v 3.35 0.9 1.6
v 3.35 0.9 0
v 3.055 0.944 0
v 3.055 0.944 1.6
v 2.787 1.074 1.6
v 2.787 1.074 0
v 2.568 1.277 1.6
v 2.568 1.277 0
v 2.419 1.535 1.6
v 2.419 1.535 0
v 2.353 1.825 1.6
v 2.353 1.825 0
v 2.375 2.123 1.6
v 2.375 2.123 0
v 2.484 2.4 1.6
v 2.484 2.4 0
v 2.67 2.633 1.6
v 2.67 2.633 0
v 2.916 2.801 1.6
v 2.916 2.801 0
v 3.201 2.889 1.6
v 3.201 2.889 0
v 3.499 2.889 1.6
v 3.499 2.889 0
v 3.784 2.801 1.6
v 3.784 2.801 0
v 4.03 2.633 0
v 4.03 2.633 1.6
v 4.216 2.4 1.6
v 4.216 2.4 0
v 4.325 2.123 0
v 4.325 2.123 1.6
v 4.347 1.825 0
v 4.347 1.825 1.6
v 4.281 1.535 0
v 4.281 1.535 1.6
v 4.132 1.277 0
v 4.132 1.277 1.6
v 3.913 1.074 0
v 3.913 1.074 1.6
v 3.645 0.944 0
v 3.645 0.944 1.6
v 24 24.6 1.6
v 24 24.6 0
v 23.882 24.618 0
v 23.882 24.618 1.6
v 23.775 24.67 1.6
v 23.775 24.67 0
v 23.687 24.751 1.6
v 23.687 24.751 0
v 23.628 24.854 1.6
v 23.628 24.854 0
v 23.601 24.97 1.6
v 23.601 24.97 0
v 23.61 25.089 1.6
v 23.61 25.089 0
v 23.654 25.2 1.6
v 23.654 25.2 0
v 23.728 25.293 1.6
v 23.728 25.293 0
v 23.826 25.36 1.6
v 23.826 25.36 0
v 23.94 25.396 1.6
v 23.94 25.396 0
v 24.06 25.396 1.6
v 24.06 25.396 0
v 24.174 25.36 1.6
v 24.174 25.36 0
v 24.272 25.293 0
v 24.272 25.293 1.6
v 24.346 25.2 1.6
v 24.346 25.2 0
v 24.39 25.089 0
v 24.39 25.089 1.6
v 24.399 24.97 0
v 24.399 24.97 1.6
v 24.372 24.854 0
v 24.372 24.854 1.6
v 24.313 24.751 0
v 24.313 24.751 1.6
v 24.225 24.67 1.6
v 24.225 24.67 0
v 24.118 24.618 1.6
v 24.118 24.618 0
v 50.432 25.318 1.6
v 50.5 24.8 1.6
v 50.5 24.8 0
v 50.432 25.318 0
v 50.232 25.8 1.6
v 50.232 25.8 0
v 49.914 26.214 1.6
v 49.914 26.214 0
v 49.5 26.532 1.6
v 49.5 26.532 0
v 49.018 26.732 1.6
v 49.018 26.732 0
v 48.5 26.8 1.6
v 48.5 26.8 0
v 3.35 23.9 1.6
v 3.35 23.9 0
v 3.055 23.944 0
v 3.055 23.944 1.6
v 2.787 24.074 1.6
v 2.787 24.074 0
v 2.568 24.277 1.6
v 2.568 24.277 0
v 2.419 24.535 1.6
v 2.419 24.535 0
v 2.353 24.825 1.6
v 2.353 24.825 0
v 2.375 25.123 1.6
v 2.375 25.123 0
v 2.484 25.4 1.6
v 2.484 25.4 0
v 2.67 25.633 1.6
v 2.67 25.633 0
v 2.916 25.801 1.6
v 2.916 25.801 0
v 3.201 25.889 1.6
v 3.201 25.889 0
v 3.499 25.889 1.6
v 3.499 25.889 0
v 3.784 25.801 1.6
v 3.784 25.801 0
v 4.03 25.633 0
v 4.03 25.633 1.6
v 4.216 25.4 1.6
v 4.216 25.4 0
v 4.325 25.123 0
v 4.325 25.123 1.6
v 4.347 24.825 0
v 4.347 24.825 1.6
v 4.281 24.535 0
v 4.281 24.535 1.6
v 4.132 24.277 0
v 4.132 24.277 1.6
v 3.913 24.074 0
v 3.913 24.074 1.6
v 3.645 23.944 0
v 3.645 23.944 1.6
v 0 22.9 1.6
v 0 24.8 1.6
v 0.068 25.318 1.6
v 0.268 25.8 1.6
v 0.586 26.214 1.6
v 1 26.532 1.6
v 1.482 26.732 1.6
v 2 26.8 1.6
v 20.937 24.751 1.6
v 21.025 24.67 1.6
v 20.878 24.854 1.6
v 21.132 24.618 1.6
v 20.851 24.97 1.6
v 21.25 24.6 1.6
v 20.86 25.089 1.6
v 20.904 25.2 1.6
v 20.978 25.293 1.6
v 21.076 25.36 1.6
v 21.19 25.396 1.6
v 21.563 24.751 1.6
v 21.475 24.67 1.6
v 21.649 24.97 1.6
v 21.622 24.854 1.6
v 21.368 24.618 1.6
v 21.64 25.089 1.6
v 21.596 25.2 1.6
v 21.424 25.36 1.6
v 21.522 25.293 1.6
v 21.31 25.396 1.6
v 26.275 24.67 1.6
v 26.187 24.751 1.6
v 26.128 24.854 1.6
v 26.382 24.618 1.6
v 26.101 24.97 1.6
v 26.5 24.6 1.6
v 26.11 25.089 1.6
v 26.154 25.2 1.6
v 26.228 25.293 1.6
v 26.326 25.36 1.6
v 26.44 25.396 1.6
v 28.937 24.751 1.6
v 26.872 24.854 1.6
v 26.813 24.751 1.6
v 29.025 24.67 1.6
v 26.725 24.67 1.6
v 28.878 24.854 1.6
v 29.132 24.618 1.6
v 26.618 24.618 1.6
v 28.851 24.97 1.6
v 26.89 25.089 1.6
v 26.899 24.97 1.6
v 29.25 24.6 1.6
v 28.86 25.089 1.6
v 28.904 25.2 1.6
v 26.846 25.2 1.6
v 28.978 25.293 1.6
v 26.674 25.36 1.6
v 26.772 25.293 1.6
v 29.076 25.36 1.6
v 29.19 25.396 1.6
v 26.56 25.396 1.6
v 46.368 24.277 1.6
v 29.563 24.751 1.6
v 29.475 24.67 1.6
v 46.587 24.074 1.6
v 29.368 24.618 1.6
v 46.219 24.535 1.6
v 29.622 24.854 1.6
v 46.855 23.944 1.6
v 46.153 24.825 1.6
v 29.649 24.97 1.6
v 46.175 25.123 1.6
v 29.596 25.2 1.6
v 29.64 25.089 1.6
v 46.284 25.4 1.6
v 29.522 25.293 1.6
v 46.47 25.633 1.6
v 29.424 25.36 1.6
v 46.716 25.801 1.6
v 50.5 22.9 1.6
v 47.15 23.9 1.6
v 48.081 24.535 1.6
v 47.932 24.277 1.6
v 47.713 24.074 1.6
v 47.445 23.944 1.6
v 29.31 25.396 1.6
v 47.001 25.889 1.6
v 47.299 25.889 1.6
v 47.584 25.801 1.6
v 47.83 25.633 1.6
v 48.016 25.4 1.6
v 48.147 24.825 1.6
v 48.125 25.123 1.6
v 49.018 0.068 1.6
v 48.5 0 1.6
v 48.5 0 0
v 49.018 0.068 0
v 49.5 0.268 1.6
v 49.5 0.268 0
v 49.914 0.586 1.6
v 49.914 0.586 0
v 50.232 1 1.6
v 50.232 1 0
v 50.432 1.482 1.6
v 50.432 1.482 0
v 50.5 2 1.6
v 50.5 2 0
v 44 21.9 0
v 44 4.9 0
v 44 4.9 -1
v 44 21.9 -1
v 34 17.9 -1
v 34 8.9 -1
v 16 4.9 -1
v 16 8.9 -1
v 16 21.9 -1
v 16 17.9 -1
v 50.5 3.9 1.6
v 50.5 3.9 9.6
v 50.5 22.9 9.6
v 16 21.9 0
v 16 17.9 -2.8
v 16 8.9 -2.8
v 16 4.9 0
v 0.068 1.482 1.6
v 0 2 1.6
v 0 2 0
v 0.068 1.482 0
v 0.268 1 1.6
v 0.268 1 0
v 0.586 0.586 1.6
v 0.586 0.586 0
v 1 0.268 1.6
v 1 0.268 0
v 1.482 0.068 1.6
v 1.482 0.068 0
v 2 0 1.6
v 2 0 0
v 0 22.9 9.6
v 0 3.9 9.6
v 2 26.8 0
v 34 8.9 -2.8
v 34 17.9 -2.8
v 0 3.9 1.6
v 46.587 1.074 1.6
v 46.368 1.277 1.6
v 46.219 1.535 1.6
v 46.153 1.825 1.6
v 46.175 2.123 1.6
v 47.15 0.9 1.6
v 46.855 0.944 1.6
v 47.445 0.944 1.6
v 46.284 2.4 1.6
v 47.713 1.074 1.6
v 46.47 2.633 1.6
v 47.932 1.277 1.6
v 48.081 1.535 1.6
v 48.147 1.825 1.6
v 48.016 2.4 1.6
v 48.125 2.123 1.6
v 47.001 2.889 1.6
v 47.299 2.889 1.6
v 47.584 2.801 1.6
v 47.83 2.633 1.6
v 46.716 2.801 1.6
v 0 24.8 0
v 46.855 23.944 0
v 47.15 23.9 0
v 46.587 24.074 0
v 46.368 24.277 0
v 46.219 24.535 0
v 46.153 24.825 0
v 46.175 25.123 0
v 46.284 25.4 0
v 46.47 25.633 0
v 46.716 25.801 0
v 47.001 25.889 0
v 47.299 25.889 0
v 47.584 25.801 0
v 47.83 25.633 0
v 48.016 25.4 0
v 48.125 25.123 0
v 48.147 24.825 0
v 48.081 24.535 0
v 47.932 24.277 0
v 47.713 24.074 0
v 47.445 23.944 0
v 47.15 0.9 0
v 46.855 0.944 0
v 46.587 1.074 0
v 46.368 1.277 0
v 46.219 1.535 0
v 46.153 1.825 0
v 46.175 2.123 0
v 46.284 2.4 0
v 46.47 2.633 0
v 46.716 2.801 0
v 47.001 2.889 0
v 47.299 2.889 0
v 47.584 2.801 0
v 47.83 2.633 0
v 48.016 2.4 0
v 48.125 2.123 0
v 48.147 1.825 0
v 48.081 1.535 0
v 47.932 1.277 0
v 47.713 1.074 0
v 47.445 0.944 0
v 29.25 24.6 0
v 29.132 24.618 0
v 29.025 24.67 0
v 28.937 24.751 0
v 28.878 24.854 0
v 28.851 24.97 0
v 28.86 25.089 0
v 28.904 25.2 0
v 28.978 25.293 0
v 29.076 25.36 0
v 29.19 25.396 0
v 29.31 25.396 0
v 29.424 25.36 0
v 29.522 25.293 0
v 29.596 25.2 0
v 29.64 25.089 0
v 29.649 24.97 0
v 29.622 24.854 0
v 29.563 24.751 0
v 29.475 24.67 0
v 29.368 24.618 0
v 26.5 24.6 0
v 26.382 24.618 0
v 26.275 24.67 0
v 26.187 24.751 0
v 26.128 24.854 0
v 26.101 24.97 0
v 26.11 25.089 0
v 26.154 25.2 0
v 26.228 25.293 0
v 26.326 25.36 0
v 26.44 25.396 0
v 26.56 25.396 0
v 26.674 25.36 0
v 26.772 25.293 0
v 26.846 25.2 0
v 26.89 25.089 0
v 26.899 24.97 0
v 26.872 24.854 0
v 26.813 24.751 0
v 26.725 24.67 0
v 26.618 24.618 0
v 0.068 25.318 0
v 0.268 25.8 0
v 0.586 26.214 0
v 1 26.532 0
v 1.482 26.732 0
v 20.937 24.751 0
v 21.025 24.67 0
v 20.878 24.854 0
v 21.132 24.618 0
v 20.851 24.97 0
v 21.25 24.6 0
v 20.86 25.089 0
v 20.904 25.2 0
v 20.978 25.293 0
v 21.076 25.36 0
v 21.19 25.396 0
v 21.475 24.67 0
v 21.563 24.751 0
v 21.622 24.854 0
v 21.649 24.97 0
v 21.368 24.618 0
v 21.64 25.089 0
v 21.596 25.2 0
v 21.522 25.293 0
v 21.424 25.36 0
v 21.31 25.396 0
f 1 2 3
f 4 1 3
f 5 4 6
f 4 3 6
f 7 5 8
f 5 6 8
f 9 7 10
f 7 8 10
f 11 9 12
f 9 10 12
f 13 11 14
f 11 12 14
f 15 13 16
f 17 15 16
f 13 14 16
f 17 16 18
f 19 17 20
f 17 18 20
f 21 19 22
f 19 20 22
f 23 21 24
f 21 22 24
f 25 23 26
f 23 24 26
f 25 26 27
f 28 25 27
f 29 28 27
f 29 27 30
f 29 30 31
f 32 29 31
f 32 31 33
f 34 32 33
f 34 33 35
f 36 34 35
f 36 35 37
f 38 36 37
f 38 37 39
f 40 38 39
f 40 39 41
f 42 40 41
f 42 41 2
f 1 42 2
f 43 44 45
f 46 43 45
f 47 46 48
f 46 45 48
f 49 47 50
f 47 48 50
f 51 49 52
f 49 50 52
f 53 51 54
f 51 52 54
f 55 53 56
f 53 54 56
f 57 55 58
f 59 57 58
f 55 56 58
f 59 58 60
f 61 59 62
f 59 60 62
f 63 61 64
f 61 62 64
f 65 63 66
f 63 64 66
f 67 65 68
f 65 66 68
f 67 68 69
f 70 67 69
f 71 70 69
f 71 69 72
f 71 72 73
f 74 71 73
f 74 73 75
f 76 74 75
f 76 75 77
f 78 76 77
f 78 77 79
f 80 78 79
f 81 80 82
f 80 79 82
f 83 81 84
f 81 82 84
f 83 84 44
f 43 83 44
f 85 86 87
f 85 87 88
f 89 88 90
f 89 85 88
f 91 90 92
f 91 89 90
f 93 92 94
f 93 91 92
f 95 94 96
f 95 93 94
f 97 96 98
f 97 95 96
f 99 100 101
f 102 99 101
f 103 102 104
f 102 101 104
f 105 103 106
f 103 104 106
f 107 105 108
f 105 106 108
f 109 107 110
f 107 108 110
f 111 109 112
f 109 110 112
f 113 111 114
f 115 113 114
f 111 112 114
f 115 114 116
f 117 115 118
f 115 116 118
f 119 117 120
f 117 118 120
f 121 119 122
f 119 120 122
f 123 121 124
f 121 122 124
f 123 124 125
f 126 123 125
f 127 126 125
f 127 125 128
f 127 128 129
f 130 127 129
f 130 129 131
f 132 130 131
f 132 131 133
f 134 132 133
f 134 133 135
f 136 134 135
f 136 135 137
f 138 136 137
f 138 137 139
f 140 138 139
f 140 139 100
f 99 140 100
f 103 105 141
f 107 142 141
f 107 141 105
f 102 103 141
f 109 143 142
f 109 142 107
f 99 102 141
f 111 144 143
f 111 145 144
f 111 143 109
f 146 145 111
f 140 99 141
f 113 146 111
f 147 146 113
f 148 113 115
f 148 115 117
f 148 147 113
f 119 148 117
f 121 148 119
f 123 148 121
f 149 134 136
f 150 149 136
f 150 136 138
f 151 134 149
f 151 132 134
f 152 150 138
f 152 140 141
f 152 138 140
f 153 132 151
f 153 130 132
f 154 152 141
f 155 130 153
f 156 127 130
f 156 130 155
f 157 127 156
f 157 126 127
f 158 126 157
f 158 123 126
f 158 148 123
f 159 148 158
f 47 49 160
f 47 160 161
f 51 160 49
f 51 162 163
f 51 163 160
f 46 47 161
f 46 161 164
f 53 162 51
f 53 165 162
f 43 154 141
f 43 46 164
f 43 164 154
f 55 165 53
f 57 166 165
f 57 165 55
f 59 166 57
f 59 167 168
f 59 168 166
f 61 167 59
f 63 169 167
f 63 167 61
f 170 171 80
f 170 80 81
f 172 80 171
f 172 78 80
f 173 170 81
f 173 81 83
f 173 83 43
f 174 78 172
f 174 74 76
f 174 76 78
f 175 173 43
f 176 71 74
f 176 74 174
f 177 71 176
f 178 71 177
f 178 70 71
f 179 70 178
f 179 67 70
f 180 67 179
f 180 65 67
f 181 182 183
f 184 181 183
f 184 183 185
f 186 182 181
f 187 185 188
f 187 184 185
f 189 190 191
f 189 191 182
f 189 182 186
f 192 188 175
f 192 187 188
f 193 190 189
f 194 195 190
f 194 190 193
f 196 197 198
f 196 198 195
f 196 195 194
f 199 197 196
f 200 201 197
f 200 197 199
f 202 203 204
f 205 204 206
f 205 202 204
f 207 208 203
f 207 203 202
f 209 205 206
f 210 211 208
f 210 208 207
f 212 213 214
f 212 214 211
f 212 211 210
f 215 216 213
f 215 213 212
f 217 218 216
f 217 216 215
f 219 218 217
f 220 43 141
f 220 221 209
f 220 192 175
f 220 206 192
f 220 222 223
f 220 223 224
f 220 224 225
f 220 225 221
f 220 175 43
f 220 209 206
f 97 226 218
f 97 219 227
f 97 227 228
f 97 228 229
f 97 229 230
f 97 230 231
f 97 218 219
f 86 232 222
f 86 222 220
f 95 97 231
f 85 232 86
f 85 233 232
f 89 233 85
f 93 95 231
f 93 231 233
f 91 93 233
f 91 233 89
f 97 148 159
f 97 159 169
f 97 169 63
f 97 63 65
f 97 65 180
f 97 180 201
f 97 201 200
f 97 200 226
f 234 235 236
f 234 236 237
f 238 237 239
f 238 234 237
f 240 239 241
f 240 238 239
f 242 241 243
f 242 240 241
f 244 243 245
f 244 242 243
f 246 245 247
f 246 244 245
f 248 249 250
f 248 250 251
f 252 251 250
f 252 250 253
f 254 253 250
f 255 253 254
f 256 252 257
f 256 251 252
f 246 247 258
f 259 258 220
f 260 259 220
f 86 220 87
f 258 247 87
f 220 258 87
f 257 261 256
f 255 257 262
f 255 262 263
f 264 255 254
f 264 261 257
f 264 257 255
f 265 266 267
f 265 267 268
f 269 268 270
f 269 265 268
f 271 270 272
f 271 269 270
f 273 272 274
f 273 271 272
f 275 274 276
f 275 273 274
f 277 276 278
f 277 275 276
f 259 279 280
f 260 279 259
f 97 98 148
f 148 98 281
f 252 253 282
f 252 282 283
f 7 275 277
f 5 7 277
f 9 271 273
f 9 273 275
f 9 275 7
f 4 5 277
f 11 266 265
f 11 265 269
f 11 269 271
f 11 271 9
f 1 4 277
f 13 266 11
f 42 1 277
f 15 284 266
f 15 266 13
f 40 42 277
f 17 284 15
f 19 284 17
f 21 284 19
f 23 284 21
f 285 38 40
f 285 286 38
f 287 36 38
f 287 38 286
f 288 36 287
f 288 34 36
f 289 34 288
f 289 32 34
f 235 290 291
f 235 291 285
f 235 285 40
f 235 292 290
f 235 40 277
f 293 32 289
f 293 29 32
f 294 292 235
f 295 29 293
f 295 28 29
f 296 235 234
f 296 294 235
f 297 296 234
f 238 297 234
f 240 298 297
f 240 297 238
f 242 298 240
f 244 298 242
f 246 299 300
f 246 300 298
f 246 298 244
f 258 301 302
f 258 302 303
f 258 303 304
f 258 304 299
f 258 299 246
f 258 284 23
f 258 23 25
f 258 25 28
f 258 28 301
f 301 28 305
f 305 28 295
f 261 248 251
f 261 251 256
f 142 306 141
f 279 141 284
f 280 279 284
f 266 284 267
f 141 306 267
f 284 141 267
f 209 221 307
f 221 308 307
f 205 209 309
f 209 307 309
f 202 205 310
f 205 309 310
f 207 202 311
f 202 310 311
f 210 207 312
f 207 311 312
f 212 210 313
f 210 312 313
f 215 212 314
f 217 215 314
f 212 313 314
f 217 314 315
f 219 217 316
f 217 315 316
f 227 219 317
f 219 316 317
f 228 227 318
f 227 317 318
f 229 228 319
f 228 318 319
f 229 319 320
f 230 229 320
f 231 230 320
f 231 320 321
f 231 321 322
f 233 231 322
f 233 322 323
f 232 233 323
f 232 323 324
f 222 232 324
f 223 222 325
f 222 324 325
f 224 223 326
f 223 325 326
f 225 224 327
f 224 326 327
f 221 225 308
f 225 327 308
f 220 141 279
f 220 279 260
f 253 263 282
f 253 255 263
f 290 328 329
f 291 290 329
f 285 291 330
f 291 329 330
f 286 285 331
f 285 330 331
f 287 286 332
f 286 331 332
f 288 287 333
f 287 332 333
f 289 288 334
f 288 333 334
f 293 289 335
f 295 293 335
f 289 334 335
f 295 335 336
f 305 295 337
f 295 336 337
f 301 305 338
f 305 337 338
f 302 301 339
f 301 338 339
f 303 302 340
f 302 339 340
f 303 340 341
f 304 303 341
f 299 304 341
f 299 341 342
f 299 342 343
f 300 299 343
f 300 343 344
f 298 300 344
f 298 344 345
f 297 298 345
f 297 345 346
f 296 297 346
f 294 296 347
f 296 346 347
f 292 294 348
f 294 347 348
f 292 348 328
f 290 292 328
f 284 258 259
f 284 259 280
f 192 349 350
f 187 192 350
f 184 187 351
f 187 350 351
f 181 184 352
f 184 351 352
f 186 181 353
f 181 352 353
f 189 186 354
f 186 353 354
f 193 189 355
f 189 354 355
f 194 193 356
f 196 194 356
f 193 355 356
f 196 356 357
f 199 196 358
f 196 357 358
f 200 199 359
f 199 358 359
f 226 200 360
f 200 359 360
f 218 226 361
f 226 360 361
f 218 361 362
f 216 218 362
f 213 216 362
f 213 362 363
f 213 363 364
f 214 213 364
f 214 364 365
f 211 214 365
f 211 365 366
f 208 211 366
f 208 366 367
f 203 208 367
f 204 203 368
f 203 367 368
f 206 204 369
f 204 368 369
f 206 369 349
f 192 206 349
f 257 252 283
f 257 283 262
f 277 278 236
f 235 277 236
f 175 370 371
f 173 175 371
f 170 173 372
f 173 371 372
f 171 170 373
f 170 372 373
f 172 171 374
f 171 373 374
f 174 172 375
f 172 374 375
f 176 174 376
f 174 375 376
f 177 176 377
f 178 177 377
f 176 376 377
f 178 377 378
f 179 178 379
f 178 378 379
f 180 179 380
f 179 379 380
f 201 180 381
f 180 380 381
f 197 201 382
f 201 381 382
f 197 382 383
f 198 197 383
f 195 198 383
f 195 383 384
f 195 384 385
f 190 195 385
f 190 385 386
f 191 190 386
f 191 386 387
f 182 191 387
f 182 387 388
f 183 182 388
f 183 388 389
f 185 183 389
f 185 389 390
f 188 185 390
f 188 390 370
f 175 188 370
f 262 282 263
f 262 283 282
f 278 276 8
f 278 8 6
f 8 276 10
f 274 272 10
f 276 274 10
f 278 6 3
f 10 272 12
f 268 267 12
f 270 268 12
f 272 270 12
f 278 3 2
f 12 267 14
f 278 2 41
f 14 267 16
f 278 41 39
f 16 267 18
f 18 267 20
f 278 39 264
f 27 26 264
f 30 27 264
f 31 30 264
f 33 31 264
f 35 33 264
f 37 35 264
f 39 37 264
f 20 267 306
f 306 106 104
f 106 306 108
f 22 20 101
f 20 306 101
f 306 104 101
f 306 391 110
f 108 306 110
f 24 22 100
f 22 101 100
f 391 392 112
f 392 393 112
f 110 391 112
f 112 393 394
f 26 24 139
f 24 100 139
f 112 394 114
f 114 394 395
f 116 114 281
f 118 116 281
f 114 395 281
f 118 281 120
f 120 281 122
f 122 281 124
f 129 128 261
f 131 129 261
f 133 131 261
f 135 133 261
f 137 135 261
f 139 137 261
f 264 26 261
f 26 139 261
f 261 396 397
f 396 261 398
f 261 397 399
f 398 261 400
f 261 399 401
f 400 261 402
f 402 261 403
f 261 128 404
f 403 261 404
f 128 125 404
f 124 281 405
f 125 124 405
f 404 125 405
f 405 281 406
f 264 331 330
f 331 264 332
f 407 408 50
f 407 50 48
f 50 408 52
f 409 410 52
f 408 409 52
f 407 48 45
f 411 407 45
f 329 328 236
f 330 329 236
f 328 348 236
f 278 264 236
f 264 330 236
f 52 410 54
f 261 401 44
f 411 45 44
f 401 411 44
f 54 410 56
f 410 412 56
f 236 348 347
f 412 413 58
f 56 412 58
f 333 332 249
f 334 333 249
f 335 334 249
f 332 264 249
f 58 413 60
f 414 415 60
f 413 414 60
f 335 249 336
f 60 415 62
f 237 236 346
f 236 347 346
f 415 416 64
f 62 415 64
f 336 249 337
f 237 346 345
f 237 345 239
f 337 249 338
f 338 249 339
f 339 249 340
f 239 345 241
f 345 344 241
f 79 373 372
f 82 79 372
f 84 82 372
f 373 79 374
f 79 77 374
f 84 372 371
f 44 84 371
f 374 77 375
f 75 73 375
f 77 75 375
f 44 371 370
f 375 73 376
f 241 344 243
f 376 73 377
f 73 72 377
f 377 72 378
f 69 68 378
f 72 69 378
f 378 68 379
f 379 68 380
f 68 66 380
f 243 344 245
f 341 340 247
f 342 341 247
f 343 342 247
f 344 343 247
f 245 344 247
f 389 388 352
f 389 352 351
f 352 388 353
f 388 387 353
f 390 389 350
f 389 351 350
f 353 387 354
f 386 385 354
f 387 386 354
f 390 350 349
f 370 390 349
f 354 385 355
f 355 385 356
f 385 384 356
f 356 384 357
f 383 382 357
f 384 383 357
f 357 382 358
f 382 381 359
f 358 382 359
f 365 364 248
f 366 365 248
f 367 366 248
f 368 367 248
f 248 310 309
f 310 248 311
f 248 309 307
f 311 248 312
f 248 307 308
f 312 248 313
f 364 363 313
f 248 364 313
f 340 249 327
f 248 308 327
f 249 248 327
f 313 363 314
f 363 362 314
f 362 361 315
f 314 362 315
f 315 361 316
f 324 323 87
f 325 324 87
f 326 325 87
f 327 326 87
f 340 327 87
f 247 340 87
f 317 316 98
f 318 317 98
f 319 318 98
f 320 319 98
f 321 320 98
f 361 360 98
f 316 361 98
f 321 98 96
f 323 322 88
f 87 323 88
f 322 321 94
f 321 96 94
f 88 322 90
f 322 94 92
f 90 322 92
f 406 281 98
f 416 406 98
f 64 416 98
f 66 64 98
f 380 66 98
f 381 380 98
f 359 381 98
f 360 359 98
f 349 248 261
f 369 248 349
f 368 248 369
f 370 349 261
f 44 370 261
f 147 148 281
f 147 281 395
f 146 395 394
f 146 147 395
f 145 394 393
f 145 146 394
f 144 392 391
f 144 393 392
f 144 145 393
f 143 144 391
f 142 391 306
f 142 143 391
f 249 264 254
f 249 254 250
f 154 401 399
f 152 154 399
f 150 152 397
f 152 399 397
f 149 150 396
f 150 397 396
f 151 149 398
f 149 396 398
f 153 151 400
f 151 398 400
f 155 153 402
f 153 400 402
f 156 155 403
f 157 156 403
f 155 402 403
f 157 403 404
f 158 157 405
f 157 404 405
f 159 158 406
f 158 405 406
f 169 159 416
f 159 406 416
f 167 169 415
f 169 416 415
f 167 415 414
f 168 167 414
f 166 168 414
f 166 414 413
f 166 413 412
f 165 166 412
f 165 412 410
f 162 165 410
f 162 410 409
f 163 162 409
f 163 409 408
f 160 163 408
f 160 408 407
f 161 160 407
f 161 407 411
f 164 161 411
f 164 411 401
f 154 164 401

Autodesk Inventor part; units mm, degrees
ref_plane "YZ Plane" through (0, 0, 0) normal (1, 0, 0) x (0, 1, 0)
ref_plane "XZ Plane" through (0, 0, 0) normal (0, 1, 0) x (-1, 0, 0)
ref_plane "XY Plane" through (0, 0, 0) normal (0, 0, 1) x (1, 0, 0)
sketch "Sketch1" plane through (0, 0, 0) normal (0, 0, 1) x (1, 0, 0)
  line L0 (0, 0) -> (50.5, 0)
  line L1 (50.5, 0) -> (50.5, 26.8)
  line L2 (50.5, 26.8) -> (0, 26.8)
  line L3 (0, 26.8) -> (0, 0)
  dimension "d0" = 50.5
  dimension "d1" = 26.8
extrude "Extrusion1" add sketch "Sketch1" along normal blind 1.6
sketch "Esquisse2" plane through (0, 0, 1.6) normal (0, 0, 1) x (1, 0, 0)
  line L0 (0, 0) -> (50.5, 0) construction
  line L1 (50.5, 0) -> (50.5, 26.8) construction
  line L2 (50.5, 26.8) -> (0, 26.8) construction
  line L3 (0, 26.8) -> (0, 0) construction
  line L4 (3.35, 24.9) -> (47.15, 24.9) construction
  line L5 (47.15, 24.9) -> (47.15, 1.9) construction
  line L6 (47.15, 1.9) -> (3.35, 1.9) construction
  line L7 (3.35, 1.9) -> (3.35, 24.9) construction
  line L8 (25.25, 26.8) -> (25.25, 0) construction
  line L9 (0, 13.4) -> (50.5, 13.4) construction
  dimension "d4" = 43.8
  dimension "d5" = 23
hole "Perçage1" at (3.35, 24.9, 1.6) at (3.35, 1.9, 1.6) at (47.15, 24.9, 1.6) at (47.15, 1.9, 1.6) direction (0, 0, -1) diameter 2 end through all
fillet "Congé1" radius 2 4 edges at (0, 26.8, 0.8) (50.5, 26.8, 0.8) (50.5, 0, 0.8) (0, 0, 0.8)
sketch "Esquisse3" plane through (0, 0, 1.6) normal (0, 0, 1) x (1, 0, 0)
  arc A0 (0, 2) -> (2, 0) centre (2, 2) ccw construction
  line L0 (2, 0) -> (48.5, 0) construction
  arc A1 (48.5, 0) -> (50.5, 2) centre (48.5, 2) ccw construction
  line L1 (50.5, 2) -> (50.5, 24.8) construction
  arc A2 (50.5, 24.8) -> (48.5, 26.8) centre (48.5, 24.8) ccw construction
  line L2 (48.5, 26.8) -> (2, 26.8) construction
  arc A3 (2, 26.8) -> (0, 24.8) centre (2, 24.8) ccw construction
  line L3 (0, 24.8) -> (0, 2) construction
  circle A4 centre (47.15, 24.9) radius 1 construction
  circle A5 centre (3.35, 24.9) radius 1 construction
  circle A6 centre (3.35, 1.9) radius 1 construction
  circle A7 centre (47.15, 1.9) radius 1 construction
  line L4 (0, 22.9) -> (50.5, 22.9)
  line L5 (50.5, 22.9) -> (50.5, 3.9)
  line L6 (50.5, 3.9) -> (0, 3.9)
  line L7 (0, 3.9) -> (0, 22.9)
  line L8 (25.25, 26.8) -> (25.25, 0) construction
  line L9 (0, 13.4) -> (50.5, 13.4) construction
  point P0 (0, 0)
  dimension "d14" = 19
extrude "Extrusion2" add sketch "Esquisse3" along normal blind 8
sketch "Esquisse4" plane through (0, 0, 0) normal (0, 0, -1) x (-1, 0, 0)
  circle A0 centre (-47.15, 24.9) radius 1 construction
  circle A1 centre (-3.35, 24.9) radius 1 construction
  circle A2 centre (-3.35, 1.9) radius 1 construction
  circle A3 centre (-47.15, 1.9) radius 1 construction
  arc A4 (-2, 0) -> (0, 2) centre (-2, 2) ccw construction
  line L0 (0, 24.8) -> (0, 2) construction
  arc A5 (0, 24.8) -> (-2, 26.8) centre (-2, 24.8) ccw construction
  line L1 (-48.5, 26.8) -> (-2, 26.8) construction
  arc A6 (-48.5, 26.8) -> (-50.5, 24.8) centre (-48.5, 24.8) ccw construction
  line L2 (-50.5, 2) -> (-50.5, 24.8) construction
  arc A7 (-50.5, 2) -> (-48.5, 0) centre (-48.5, 2) ccw construction
  line L3 (-2, 0) -> (-48.5, 0) construction
  line L4 (-34, 17.9) -> (-16, 17.9)
  line L5 (-16, 17.9) -> (-16, 8.9)
  line L6 (-16, 8.9) -> (-34, 8.9)
  line L7 (-34, 8.9) -> (-34, 17.9)
  line L8 (-50.5, 13.4) -> (0, 13.4) construction
  point P0 (0, 0)
  dimension "d17" = 18
  dimension "d18" = 9
  dimension "d19" = 16
extrude "Extrusion3" add sketch "Esquisse4" along normal blind 2.8
sketch "Esquisse5" plane through (0, 0, 0) normal (0, 0, -1) x (-1, 0, 0)
  line L0 (-16, 17.9) -> (-16, 8.9) construction
  line L1 (-16, 8.9) -> (-34, 8.9) construction
  line L2 (-34, 8.9) -> (-34, 17.9) construction
  line L3 (-34, 17.9) -> (-16, 17.9) construction
  circle A0 centre (-47.15, 24.9) radius 1 construction
  circle A1 centre (-3.35, 24.9) radius 1 construction
  circle A2 centre (-3.35, 1.9) radius 1 construction
  circle A3 centre (-47.15, 1.9) radius 1 construction
  arc A4 (-2, 0) -> (0, 2) centre (-2, 2) ccw construction
  line L4 (0, 24.8) -> (0, 2) construction
  arc A5 (0, 24.8) -> (-2, 26.8) centre (-2, 24.8) ccw construction
  line L5 (-48.5, 26.8) -> (-2, 26.8) construction
  arc A6 (-48.5, 26.8) -> (-50.5, 24.8) centre (-48.5, 24.8) ccw construction
  line L6 (-50.5, 2) -> (-50.5, 24.8) construction
  arc A7 (-50.5, 2) -> (-48.5, 0) centre (-48.5, 2) ccw construction
  line L7 (-2, 0) -> (-48.5, 0) construction
  line L8 (-44, 21.9) -> (-16, 21.9)
  line L9 (-16, 21.9) -> (-16, 4.9)
  line L10 (-16, 4.9) -> (-44, 4.9)
  line L11 (-44, 4.9) -> (-44, 21.9)
  line L12 (-16, 17.9) -> (-34, 17.9) construction
  line L13 (-34, 17.9) -> (-34, 8.9) construction
  line L14 (-34, 8.9) -> (-16, 8.9) construction
  line L15 (-16, 8.9) -> (-16, 17.9) construction
  line L16 (-50.5, 13.4) -> (0, 13.4) construction
  point P0 (0, 0)
  dimension "d22" = 28
  dimension "d23" = 17
extrude "Extrusion4" add sketch "Esquisse5" along normal blind 1
sketch "Esquisse6" plane through (0, 0, 1.6) normal (0, 0, 1) x (1, 0, 0)
  line L0 (0, 22.9) -> (50.5, 22.9) construction
  line L1 (50.5, 22.9) -> (50.5, 24.8) construction
  arc A0 (50.5, 24.8) -> (48.5, 26.8) centre (48.5, 24.8) ccw construction
  line L2 (48.5, 26.8) -> (2, 26.8) construction
  arc A1 (2, 26.8) -> (0, 24.8) centre (2, 24.8) ccw construction
  line L3 (0, 24.8) -> (0, 22.9) construction
  circle A2 centre (47.15, 24.9) radius 1 construction
  circle A3 centre (3.35, 24.9) radius 1 construction
  line L4 (21.25, 25) -> (29.25, 25) construction
  line L5 (50.5, 3.9) -> (0, 3.9) construction
  line L6 (0, 3.9) -> (0, 2) construction
  arc A4 (0, 2) -> (2, 0) centre (2, 2) ccw construction
  line L7 (2, 0) -> (48.5, 0) construction
  arc A5 (48.5, 0) -> (50.5, 2) centre (48.5, 2) ccw construction
  line L8 (50.5, 2) -> (50.5, 3.9) construction
  circle A6 centre (3.35, 1.9) radius 1 construction
  circle A7 centre (47.15, 1.9) radius 1 construction
  line L9 (25.25, 26.8) -> (25.25, 0) construction
  point P0 (0, 0)
  point P1 (26.5, 25)
  point P2 (24, 25)
  dimension "d26" = 8
  dimension "d27" = 1.8
  dimension "d28" = 2.5
hole "Perçage2" at (21.25, 25, 1.6) at (29.25, 25, 1.6) at (26.5, 25, 1.6) at (24, 25, 1.6) direction (0, 0, -1) diameter 0.8 end through all
sketch "Esquisse7" plane through (0, 0, 9.6) normal (0, 0, 1) x (1, 0, 0)
  line L0 (7.75, 18.4) -> (42.75, 18.4) construction
  line L1 (42.75, 18.4) -> (42.75, 8.4) construction
  line L2 (42.75, 8.4) -> (7.75, 8.4) construction
  line L3 (7.75, 8.4) -> (7.75, 18.4) construction
  line L4 (50.5, 22.9) -> (0, 22.9) construction
  line L5 (0, 22.9) -> (0, 3.9) construction
  line L6 (0, 3.9) -> (50.5, 3.9) construction
  line L7 (50.5, 3.9) -> (50.5, 22.9) construction
  line L8 (25.25, 22.9) -> (25.25, 3.9) construction
  line L9 (0, 13.4) -> (50.5, 13.4) construction
  point P0 (0, 0)
  dimension "d2" = 1.6
  dimension "d36" = 35
  dimension "d37" = 10
properties part number "C001"
